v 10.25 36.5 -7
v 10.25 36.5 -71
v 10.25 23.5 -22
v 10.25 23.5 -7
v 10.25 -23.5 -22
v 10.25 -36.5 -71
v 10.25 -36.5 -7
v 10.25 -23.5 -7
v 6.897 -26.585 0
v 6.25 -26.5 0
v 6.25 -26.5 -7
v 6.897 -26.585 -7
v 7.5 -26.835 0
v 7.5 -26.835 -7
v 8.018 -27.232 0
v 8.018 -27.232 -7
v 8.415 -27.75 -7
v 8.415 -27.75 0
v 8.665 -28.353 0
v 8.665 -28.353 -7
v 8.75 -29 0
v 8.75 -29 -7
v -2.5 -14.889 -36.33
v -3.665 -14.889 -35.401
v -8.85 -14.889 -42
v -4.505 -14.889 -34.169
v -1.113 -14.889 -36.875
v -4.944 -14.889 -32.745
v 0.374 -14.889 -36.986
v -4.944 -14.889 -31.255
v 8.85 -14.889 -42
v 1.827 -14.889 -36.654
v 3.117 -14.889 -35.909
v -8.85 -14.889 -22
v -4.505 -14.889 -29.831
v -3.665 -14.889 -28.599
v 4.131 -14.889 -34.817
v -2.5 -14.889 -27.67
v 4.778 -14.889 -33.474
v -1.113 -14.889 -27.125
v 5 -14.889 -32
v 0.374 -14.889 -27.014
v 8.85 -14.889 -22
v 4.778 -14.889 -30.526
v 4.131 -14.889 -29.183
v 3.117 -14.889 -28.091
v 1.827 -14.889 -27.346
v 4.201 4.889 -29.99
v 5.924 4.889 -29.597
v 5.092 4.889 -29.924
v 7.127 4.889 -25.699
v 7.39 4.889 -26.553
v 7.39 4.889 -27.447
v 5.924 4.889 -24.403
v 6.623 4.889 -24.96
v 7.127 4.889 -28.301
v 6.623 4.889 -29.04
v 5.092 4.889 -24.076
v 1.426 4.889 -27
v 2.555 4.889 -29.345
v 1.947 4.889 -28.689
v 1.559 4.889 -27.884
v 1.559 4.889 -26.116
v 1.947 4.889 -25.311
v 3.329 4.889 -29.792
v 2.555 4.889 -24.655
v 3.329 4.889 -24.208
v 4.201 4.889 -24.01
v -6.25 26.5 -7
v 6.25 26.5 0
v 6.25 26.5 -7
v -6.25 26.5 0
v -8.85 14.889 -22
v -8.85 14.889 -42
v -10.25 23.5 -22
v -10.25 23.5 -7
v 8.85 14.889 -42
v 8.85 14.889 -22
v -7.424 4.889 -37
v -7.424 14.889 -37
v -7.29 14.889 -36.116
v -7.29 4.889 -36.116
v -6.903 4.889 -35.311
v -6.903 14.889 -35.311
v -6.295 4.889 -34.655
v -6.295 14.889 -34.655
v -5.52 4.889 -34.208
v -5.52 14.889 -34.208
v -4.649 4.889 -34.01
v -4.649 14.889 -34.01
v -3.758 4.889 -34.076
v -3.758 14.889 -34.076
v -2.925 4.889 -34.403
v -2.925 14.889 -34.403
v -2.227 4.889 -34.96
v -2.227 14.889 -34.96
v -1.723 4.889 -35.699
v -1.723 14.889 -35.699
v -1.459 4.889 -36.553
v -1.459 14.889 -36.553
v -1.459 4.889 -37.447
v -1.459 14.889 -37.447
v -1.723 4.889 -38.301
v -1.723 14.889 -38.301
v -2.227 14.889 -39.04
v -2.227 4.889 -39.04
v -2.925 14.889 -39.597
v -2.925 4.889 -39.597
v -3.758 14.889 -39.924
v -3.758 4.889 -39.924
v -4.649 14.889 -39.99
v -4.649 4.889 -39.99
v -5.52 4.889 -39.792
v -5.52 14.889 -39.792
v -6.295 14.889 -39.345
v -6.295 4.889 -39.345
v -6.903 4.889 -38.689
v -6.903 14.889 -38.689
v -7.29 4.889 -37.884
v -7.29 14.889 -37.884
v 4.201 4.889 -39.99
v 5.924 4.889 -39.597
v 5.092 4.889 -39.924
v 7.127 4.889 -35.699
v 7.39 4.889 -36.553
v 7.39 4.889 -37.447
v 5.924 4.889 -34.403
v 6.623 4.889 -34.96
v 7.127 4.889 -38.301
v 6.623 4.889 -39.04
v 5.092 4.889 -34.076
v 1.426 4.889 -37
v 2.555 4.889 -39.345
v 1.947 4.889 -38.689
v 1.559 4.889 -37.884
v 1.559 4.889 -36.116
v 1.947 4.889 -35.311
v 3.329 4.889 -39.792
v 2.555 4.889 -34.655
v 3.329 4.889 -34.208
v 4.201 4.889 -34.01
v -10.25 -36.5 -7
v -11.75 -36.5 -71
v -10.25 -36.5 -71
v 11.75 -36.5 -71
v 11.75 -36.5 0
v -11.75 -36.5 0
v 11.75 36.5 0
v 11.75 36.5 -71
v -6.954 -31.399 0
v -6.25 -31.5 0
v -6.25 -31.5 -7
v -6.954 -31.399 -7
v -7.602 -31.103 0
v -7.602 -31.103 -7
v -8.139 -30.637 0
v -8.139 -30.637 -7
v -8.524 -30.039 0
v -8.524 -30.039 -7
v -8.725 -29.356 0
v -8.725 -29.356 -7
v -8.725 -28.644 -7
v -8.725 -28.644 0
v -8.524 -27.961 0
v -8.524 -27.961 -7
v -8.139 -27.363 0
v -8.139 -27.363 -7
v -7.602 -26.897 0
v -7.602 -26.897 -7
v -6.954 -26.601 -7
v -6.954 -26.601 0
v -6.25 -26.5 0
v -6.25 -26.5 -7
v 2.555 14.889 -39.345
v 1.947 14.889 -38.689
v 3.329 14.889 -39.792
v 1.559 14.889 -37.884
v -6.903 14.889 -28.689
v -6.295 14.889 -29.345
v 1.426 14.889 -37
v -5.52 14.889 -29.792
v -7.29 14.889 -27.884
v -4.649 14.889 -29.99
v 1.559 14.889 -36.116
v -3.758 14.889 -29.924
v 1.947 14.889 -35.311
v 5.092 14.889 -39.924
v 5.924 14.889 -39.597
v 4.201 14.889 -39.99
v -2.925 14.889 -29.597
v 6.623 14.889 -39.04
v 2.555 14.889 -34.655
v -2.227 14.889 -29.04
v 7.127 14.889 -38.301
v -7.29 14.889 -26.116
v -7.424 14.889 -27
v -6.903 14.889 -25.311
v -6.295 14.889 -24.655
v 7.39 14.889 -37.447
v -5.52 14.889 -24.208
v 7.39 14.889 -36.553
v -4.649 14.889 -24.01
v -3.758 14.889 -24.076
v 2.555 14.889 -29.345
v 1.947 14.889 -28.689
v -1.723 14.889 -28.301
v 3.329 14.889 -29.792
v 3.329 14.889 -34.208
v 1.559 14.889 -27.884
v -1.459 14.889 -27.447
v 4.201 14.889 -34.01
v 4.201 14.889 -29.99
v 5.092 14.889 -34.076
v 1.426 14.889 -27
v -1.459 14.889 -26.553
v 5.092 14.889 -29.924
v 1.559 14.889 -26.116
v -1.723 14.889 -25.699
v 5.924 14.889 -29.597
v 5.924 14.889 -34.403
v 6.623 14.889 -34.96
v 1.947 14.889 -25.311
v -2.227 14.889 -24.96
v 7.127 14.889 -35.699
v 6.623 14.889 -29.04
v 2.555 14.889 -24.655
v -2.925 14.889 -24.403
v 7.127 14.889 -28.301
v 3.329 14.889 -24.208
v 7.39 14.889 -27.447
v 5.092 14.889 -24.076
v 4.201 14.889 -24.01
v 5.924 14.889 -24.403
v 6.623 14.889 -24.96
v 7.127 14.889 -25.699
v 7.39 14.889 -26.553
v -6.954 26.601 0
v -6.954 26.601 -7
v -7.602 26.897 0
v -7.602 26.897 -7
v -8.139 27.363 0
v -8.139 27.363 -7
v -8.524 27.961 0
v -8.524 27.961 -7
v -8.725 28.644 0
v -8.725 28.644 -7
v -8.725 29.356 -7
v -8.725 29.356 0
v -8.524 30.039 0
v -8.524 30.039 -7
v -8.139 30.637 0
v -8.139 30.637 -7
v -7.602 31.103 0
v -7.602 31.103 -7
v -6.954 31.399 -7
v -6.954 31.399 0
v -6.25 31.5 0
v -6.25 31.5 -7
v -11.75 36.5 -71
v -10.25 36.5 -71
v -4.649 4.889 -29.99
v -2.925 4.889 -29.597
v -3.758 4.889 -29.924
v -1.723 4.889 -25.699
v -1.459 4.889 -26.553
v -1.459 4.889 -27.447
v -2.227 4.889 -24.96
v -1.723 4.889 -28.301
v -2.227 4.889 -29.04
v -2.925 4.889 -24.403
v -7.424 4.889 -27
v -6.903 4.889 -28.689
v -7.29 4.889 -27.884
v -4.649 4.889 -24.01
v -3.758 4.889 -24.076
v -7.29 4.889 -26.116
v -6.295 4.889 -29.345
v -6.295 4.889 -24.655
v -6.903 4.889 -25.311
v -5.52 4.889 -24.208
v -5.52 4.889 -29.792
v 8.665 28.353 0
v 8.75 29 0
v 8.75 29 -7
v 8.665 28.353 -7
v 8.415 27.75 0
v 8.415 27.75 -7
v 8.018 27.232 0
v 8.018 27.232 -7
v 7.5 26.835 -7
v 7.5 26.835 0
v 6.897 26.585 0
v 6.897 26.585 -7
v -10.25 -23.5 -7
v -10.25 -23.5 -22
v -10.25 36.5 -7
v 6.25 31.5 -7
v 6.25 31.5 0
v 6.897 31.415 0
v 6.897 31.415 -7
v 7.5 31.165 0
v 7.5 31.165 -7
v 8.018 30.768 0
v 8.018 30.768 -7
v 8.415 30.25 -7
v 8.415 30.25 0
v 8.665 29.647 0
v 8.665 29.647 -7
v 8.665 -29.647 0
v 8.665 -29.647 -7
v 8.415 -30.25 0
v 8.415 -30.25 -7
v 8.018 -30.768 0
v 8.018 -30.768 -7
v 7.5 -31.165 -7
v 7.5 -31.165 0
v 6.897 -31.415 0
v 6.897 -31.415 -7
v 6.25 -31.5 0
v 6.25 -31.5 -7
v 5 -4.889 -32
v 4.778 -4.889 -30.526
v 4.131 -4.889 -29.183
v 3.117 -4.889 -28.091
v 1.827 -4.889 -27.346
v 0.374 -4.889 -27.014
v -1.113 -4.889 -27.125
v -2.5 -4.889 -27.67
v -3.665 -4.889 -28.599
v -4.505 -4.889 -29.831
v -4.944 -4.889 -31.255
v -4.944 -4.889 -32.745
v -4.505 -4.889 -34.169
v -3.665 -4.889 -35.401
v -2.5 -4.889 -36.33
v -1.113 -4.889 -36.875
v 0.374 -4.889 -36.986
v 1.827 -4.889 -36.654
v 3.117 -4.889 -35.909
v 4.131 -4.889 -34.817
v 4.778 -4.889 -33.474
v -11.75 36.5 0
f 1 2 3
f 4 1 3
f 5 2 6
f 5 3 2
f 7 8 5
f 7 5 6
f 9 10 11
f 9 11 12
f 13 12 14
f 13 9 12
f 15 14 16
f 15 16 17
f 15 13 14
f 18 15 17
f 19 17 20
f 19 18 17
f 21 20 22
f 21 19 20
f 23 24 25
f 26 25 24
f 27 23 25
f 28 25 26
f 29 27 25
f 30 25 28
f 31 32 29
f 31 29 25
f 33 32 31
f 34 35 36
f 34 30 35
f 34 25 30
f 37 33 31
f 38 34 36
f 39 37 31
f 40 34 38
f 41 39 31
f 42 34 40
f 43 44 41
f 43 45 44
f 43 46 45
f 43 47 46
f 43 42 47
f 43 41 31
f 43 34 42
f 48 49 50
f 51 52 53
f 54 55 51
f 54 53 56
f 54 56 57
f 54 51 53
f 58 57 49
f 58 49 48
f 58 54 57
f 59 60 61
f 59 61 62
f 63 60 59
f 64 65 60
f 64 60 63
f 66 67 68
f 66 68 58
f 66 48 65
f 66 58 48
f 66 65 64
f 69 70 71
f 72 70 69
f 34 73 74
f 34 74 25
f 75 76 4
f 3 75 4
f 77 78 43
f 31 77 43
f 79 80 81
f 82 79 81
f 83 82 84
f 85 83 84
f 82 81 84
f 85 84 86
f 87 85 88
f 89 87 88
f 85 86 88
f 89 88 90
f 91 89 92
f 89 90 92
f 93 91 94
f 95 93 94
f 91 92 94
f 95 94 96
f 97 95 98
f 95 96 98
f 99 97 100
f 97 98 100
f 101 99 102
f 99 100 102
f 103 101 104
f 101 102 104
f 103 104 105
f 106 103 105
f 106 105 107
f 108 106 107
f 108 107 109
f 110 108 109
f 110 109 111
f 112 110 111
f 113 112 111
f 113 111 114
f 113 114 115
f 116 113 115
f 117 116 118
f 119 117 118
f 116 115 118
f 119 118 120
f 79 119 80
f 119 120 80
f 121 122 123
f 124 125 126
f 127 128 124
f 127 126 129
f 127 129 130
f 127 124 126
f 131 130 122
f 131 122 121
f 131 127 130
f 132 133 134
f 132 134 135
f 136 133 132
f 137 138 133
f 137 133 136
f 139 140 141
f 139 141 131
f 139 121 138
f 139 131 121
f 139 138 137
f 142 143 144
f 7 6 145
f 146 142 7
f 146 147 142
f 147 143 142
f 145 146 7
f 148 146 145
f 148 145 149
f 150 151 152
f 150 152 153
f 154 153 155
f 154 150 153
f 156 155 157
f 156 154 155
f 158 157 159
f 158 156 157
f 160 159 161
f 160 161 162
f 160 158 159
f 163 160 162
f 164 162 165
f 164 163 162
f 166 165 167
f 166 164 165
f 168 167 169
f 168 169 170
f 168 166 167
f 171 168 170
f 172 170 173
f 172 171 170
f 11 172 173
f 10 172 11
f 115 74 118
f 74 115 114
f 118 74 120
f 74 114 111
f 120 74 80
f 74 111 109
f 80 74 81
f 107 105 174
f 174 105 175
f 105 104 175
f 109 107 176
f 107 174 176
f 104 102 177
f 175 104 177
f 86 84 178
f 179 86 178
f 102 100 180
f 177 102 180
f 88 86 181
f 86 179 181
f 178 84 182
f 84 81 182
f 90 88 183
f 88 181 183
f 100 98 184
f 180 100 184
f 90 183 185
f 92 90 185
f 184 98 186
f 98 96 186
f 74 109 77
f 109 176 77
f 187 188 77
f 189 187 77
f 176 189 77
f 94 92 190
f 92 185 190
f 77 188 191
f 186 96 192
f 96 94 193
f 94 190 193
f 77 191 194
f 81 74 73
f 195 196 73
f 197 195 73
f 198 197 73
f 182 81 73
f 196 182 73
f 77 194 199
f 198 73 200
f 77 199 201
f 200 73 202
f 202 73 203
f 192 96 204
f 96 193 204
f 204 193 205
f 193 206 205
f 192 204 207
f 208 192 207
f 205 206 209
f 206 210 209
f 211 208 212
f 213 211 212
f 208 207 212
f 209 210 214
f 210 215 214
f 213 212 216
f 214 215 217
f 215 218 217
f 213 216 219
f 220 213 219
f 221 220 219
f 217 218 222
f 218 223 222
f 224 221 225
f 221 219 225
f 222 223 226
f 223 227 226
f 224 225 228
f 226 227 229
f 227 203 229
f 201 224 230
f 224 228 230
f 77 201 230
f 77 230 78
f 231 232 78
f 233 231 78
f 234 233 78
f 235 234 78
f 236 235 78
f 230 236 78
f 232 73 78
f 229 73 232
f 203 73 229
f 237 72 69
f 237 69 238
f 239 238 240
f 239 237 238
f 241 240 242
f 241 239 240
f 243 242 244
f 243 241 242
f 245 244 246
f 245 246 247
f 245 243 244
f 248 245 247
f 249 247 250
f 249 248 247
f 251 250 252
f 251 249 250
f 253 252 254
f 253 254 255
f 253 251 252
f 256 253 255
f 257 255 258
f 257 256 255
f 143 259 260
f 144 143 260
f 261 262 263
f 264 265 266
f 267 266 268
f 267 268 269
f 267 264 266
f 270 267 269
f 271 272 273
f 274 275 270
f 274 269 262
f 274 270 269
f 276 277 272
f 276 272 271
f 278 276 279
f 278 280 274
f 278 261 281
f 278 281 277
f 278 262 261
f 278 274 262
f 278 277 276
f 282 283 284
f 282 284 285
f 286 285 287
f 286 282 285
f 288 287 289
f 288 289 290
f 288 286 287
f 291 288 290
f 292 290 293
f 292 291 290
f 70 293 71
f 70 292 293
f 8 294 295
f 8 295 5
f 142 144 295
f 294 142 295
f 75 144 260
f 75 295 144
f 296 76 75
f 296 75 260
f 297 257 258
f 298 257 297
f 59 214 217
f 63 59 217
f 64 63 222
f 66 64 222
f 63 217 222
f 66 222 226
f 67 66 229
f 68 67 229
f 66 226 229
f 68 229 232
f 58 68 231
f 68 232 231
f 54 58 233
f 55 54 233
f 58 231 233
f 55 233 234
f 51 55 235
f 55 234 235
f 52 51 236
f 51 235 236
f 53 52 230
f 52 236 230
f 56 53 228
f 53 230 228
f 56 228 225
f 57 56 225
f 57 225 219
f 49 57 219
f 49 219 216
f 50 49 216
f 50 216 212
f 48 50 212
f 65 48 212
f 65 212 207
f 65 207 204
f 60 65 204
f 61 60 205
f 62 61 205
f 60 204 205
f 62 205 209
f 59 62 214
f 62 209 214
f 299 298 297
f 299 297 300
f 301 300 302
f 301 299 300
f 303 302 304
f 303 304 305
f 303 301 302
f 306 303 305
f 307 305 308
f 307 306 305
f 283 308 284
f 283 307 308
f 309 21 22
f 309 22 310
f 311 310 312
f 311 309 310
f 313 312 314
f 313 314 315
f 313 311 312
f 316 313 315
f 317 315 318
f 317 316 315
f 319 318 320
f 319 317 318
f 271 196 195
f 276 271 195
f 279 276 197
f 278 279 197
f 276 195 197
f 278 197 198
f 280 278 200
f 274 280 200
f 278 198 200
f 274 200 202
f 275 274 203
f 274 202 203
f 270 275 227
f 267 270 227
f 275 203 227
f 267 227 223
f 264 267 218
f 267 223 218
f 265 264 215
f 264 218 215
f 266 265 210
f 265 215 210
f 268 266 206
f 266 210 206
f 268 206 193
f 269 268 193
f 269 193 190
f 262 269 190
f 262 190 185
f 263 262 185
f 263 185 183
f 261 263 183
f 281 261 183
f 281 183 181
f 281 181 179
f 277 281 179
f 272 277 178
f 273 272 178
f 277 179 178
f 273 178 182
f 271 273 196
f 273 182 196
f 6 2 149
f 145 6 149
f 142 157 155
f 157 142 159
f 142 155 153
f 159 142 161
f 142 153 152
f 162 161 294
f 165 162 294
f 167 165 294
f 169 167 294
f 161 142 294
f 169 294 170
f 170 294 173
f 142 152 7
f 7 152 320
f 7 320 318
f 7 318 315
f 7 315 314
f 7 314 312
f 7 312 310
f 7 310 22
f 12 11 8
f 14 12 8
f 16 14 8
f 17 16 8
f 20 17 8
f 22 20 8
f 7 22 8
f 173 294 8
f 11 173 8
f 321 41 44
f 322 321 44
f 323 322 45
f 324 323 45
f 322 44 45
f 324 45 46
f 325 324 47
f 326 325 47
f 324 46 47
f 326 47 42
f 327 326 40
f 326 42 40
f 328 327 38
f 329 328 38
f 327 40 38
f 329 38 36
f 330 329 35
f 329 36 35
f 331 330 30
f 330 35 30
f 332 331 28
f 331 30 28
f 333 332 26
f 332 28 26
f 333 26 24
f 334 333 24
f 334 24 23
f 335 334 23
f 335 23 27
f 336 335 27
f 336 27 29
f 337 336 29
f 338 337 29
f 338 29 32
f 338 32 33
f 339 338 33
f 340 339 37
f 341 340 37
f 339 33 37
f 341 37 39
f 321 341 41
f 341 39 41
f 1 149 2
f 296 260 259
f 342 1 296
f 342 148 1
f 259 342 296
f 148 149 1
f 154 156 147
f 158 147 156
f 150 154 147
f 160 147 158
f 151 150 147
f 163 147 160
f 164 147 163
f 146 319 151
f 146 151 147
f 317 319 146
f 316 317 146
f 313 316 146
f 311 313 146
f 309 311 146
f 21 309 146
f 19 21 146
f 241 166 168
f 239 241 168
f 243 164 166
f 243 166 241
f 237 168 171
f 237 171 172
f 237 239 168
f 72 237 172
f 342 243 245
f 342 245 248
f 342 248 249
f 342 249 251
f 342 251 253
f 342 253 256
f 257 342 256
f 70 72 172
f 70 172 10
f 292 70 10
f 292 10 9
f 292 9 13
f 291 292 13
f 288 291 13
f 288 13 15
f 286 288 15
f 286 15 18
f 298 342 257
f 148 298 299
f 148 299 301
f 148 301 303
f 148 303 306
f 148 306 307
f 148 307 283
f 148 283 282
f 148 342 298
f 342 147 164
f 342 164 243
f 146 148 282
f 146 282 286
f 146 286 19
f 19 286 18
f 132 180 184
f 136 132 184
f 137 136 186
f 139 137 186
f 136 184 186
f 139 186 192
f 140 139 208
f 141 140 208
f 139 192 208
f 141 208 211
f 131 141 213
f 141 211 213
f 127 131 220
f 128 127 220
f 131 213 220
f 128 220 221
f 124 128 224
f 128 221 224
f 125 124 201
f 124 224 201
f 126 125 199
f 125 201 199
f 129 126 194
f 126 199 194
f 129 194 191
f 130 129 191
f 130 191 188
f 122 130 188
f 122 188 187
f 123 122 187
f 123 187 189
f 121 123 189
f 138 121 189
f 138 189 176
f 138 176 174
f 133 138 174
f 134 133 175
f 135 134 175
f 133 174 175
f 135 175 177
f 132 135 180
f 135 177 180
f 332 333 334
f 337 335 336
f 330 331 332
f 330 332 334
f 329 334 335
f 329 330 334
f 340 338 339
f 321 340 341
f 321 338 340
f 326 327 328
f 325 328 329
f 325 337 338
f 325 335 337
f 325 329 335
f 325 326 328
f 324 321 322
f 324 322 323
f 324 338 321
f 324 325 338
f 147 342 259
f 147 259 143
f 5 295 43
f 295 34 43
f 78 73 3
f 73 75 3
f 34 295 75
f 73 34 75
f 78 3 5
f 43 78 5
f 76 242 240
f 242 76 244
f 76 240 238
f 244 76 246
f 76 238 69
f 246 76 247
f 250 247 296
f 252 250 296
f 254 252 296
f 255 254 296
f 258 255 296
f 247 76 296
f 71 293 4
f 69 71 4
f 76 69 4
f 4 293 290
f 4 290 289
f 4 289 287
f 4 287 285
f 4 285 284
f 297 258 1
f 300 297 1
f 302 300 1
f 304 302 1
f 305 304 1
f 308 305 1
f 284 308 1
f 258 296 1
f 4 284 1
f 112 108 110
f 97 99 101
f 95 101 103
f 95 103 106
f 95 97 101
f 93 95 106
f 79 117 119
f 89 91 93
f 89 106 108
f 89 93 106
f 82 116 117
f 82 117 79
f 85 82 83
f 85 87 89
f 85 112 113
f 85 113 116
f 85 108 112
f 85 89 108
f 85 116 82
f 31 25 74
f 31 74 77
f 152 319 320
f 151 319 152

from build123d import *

# Parameters (mm, degrees)
F0_W     = 20.5
F0_H     = 47
F1_DEPTH = 22
F0_H_2   = 13
F2_DEPTH = 7
F3_DEPTH = 71
F4_W     = 17.699432
F4_H     = 29.777118
F5_DEPTH = 20
F6_R     = 5
F7_DEPTH = 10
F8_R     = 2.998853
F9_DEPTH = 10


with BuildPart() as f1:
    # F0 (on Top) → F1 (new body)
    with BuildSketch(Plane.XY):
        Rectangle(F0_W, F0_H)
    extrude(amount=-F1_DEPTH)

    # F0 (on Top) → F2 (join)
    with BuildSketch(Plane.XY):
        with Locations((0, -30)):
            Rectangle(F0_W, F0_H_2)
        with BuildLine():
            ThreePointArc((-6.25, -31.5), (-8.75, -29), (-6.25, -26.5))
            Line((-6.25, -26.5), (6.25, -26.5))
            ThreePointArc((6.25, -26.5), (8.017767, -27.232233), (8.75, -29))
            ThreePointArc((8.75, -29), (8.017767, -30.767767), (6.25, -31.5))
            Line((6.25, -31.5), (-6.25, -31.5))
        make_face(mode=Mode.SUBTRACT)
        with Locations((0, 30)):
            Rectangle(F0_W, F0_H_2)
        with BuildLine():
            ThreePointArc((6.25, 31.5), (8.017767, 30.767767), (8.75, 29))
            ThreePointArc((8.75, 29), (8.017767, 27.232233), (6.25, 26.5))
            Line((6.25, 26.5), (-6.25, 26.5))
            ThreePointArc((-6.25, 26.5), (-8.75, 29), (-6.25, 31.5))
            Line((-6.25, 31.5), (6.25, 31.5))
        make_face(mode=Mode.SUBTRACT)
    extrude(amount=-F2_DEPTH)

    # F0 (on Top) → F3 (join)
    with BuildSketch(Plane.XY):
        Polygon((-10.25, 36.5), (-11.75, 36.5), (-11.75, -36.5), (-10.25, -36.5), (-10.25, -23.5), (-10.25, 23.5), align=None)
        Polygon((11.75, 36.5), (10.25, 36.5), (10.25, 23.5), (10.25, -23.5), (10.25, -36.5), (11.75, -36.5), align=None)
    extrude(amount=-F3_DEPTH)

    # F4 (on face) → F5 (join)
    with BuildSketch(Plane(origin=(0, 0, -22), x_dir=(1, 0, 0), z_dir=(0, 0, -1))):
        Rectangle(F4_W, F4_H)
    extrude(amount=F5_DEPTH)

    # F6 (on face) → F7 (cut)
    with BuildSketch(Plane.XZ.offset(14.888559)):
        with Locations((0, -32)):
            Circle(F6_R)
    extrude(amount=-F7_DEPTH, mode=Mode.SUBTRACT)

    # F8 (on face) → F9 (cut)
    with BuildSketch(Plane(origin=(0, 14.888559, 0), x_dir=(-1, 0, 0), z_dir=(0, 1, 0))):
        with Locations((4.424858, -27)):
            Circle(F8_R)
        with Locations((4.424858, -37)):
            Circle(F8_R)
        with Locations((-4.424858, -37)):
            Circle(F8_R)
        with Locations((-4.424858, -27)):
            Circle(F8_R)
    extrude(amount=-F9_DEPTH, mode=Mode.SUBTRACT)


solid = f1.part
